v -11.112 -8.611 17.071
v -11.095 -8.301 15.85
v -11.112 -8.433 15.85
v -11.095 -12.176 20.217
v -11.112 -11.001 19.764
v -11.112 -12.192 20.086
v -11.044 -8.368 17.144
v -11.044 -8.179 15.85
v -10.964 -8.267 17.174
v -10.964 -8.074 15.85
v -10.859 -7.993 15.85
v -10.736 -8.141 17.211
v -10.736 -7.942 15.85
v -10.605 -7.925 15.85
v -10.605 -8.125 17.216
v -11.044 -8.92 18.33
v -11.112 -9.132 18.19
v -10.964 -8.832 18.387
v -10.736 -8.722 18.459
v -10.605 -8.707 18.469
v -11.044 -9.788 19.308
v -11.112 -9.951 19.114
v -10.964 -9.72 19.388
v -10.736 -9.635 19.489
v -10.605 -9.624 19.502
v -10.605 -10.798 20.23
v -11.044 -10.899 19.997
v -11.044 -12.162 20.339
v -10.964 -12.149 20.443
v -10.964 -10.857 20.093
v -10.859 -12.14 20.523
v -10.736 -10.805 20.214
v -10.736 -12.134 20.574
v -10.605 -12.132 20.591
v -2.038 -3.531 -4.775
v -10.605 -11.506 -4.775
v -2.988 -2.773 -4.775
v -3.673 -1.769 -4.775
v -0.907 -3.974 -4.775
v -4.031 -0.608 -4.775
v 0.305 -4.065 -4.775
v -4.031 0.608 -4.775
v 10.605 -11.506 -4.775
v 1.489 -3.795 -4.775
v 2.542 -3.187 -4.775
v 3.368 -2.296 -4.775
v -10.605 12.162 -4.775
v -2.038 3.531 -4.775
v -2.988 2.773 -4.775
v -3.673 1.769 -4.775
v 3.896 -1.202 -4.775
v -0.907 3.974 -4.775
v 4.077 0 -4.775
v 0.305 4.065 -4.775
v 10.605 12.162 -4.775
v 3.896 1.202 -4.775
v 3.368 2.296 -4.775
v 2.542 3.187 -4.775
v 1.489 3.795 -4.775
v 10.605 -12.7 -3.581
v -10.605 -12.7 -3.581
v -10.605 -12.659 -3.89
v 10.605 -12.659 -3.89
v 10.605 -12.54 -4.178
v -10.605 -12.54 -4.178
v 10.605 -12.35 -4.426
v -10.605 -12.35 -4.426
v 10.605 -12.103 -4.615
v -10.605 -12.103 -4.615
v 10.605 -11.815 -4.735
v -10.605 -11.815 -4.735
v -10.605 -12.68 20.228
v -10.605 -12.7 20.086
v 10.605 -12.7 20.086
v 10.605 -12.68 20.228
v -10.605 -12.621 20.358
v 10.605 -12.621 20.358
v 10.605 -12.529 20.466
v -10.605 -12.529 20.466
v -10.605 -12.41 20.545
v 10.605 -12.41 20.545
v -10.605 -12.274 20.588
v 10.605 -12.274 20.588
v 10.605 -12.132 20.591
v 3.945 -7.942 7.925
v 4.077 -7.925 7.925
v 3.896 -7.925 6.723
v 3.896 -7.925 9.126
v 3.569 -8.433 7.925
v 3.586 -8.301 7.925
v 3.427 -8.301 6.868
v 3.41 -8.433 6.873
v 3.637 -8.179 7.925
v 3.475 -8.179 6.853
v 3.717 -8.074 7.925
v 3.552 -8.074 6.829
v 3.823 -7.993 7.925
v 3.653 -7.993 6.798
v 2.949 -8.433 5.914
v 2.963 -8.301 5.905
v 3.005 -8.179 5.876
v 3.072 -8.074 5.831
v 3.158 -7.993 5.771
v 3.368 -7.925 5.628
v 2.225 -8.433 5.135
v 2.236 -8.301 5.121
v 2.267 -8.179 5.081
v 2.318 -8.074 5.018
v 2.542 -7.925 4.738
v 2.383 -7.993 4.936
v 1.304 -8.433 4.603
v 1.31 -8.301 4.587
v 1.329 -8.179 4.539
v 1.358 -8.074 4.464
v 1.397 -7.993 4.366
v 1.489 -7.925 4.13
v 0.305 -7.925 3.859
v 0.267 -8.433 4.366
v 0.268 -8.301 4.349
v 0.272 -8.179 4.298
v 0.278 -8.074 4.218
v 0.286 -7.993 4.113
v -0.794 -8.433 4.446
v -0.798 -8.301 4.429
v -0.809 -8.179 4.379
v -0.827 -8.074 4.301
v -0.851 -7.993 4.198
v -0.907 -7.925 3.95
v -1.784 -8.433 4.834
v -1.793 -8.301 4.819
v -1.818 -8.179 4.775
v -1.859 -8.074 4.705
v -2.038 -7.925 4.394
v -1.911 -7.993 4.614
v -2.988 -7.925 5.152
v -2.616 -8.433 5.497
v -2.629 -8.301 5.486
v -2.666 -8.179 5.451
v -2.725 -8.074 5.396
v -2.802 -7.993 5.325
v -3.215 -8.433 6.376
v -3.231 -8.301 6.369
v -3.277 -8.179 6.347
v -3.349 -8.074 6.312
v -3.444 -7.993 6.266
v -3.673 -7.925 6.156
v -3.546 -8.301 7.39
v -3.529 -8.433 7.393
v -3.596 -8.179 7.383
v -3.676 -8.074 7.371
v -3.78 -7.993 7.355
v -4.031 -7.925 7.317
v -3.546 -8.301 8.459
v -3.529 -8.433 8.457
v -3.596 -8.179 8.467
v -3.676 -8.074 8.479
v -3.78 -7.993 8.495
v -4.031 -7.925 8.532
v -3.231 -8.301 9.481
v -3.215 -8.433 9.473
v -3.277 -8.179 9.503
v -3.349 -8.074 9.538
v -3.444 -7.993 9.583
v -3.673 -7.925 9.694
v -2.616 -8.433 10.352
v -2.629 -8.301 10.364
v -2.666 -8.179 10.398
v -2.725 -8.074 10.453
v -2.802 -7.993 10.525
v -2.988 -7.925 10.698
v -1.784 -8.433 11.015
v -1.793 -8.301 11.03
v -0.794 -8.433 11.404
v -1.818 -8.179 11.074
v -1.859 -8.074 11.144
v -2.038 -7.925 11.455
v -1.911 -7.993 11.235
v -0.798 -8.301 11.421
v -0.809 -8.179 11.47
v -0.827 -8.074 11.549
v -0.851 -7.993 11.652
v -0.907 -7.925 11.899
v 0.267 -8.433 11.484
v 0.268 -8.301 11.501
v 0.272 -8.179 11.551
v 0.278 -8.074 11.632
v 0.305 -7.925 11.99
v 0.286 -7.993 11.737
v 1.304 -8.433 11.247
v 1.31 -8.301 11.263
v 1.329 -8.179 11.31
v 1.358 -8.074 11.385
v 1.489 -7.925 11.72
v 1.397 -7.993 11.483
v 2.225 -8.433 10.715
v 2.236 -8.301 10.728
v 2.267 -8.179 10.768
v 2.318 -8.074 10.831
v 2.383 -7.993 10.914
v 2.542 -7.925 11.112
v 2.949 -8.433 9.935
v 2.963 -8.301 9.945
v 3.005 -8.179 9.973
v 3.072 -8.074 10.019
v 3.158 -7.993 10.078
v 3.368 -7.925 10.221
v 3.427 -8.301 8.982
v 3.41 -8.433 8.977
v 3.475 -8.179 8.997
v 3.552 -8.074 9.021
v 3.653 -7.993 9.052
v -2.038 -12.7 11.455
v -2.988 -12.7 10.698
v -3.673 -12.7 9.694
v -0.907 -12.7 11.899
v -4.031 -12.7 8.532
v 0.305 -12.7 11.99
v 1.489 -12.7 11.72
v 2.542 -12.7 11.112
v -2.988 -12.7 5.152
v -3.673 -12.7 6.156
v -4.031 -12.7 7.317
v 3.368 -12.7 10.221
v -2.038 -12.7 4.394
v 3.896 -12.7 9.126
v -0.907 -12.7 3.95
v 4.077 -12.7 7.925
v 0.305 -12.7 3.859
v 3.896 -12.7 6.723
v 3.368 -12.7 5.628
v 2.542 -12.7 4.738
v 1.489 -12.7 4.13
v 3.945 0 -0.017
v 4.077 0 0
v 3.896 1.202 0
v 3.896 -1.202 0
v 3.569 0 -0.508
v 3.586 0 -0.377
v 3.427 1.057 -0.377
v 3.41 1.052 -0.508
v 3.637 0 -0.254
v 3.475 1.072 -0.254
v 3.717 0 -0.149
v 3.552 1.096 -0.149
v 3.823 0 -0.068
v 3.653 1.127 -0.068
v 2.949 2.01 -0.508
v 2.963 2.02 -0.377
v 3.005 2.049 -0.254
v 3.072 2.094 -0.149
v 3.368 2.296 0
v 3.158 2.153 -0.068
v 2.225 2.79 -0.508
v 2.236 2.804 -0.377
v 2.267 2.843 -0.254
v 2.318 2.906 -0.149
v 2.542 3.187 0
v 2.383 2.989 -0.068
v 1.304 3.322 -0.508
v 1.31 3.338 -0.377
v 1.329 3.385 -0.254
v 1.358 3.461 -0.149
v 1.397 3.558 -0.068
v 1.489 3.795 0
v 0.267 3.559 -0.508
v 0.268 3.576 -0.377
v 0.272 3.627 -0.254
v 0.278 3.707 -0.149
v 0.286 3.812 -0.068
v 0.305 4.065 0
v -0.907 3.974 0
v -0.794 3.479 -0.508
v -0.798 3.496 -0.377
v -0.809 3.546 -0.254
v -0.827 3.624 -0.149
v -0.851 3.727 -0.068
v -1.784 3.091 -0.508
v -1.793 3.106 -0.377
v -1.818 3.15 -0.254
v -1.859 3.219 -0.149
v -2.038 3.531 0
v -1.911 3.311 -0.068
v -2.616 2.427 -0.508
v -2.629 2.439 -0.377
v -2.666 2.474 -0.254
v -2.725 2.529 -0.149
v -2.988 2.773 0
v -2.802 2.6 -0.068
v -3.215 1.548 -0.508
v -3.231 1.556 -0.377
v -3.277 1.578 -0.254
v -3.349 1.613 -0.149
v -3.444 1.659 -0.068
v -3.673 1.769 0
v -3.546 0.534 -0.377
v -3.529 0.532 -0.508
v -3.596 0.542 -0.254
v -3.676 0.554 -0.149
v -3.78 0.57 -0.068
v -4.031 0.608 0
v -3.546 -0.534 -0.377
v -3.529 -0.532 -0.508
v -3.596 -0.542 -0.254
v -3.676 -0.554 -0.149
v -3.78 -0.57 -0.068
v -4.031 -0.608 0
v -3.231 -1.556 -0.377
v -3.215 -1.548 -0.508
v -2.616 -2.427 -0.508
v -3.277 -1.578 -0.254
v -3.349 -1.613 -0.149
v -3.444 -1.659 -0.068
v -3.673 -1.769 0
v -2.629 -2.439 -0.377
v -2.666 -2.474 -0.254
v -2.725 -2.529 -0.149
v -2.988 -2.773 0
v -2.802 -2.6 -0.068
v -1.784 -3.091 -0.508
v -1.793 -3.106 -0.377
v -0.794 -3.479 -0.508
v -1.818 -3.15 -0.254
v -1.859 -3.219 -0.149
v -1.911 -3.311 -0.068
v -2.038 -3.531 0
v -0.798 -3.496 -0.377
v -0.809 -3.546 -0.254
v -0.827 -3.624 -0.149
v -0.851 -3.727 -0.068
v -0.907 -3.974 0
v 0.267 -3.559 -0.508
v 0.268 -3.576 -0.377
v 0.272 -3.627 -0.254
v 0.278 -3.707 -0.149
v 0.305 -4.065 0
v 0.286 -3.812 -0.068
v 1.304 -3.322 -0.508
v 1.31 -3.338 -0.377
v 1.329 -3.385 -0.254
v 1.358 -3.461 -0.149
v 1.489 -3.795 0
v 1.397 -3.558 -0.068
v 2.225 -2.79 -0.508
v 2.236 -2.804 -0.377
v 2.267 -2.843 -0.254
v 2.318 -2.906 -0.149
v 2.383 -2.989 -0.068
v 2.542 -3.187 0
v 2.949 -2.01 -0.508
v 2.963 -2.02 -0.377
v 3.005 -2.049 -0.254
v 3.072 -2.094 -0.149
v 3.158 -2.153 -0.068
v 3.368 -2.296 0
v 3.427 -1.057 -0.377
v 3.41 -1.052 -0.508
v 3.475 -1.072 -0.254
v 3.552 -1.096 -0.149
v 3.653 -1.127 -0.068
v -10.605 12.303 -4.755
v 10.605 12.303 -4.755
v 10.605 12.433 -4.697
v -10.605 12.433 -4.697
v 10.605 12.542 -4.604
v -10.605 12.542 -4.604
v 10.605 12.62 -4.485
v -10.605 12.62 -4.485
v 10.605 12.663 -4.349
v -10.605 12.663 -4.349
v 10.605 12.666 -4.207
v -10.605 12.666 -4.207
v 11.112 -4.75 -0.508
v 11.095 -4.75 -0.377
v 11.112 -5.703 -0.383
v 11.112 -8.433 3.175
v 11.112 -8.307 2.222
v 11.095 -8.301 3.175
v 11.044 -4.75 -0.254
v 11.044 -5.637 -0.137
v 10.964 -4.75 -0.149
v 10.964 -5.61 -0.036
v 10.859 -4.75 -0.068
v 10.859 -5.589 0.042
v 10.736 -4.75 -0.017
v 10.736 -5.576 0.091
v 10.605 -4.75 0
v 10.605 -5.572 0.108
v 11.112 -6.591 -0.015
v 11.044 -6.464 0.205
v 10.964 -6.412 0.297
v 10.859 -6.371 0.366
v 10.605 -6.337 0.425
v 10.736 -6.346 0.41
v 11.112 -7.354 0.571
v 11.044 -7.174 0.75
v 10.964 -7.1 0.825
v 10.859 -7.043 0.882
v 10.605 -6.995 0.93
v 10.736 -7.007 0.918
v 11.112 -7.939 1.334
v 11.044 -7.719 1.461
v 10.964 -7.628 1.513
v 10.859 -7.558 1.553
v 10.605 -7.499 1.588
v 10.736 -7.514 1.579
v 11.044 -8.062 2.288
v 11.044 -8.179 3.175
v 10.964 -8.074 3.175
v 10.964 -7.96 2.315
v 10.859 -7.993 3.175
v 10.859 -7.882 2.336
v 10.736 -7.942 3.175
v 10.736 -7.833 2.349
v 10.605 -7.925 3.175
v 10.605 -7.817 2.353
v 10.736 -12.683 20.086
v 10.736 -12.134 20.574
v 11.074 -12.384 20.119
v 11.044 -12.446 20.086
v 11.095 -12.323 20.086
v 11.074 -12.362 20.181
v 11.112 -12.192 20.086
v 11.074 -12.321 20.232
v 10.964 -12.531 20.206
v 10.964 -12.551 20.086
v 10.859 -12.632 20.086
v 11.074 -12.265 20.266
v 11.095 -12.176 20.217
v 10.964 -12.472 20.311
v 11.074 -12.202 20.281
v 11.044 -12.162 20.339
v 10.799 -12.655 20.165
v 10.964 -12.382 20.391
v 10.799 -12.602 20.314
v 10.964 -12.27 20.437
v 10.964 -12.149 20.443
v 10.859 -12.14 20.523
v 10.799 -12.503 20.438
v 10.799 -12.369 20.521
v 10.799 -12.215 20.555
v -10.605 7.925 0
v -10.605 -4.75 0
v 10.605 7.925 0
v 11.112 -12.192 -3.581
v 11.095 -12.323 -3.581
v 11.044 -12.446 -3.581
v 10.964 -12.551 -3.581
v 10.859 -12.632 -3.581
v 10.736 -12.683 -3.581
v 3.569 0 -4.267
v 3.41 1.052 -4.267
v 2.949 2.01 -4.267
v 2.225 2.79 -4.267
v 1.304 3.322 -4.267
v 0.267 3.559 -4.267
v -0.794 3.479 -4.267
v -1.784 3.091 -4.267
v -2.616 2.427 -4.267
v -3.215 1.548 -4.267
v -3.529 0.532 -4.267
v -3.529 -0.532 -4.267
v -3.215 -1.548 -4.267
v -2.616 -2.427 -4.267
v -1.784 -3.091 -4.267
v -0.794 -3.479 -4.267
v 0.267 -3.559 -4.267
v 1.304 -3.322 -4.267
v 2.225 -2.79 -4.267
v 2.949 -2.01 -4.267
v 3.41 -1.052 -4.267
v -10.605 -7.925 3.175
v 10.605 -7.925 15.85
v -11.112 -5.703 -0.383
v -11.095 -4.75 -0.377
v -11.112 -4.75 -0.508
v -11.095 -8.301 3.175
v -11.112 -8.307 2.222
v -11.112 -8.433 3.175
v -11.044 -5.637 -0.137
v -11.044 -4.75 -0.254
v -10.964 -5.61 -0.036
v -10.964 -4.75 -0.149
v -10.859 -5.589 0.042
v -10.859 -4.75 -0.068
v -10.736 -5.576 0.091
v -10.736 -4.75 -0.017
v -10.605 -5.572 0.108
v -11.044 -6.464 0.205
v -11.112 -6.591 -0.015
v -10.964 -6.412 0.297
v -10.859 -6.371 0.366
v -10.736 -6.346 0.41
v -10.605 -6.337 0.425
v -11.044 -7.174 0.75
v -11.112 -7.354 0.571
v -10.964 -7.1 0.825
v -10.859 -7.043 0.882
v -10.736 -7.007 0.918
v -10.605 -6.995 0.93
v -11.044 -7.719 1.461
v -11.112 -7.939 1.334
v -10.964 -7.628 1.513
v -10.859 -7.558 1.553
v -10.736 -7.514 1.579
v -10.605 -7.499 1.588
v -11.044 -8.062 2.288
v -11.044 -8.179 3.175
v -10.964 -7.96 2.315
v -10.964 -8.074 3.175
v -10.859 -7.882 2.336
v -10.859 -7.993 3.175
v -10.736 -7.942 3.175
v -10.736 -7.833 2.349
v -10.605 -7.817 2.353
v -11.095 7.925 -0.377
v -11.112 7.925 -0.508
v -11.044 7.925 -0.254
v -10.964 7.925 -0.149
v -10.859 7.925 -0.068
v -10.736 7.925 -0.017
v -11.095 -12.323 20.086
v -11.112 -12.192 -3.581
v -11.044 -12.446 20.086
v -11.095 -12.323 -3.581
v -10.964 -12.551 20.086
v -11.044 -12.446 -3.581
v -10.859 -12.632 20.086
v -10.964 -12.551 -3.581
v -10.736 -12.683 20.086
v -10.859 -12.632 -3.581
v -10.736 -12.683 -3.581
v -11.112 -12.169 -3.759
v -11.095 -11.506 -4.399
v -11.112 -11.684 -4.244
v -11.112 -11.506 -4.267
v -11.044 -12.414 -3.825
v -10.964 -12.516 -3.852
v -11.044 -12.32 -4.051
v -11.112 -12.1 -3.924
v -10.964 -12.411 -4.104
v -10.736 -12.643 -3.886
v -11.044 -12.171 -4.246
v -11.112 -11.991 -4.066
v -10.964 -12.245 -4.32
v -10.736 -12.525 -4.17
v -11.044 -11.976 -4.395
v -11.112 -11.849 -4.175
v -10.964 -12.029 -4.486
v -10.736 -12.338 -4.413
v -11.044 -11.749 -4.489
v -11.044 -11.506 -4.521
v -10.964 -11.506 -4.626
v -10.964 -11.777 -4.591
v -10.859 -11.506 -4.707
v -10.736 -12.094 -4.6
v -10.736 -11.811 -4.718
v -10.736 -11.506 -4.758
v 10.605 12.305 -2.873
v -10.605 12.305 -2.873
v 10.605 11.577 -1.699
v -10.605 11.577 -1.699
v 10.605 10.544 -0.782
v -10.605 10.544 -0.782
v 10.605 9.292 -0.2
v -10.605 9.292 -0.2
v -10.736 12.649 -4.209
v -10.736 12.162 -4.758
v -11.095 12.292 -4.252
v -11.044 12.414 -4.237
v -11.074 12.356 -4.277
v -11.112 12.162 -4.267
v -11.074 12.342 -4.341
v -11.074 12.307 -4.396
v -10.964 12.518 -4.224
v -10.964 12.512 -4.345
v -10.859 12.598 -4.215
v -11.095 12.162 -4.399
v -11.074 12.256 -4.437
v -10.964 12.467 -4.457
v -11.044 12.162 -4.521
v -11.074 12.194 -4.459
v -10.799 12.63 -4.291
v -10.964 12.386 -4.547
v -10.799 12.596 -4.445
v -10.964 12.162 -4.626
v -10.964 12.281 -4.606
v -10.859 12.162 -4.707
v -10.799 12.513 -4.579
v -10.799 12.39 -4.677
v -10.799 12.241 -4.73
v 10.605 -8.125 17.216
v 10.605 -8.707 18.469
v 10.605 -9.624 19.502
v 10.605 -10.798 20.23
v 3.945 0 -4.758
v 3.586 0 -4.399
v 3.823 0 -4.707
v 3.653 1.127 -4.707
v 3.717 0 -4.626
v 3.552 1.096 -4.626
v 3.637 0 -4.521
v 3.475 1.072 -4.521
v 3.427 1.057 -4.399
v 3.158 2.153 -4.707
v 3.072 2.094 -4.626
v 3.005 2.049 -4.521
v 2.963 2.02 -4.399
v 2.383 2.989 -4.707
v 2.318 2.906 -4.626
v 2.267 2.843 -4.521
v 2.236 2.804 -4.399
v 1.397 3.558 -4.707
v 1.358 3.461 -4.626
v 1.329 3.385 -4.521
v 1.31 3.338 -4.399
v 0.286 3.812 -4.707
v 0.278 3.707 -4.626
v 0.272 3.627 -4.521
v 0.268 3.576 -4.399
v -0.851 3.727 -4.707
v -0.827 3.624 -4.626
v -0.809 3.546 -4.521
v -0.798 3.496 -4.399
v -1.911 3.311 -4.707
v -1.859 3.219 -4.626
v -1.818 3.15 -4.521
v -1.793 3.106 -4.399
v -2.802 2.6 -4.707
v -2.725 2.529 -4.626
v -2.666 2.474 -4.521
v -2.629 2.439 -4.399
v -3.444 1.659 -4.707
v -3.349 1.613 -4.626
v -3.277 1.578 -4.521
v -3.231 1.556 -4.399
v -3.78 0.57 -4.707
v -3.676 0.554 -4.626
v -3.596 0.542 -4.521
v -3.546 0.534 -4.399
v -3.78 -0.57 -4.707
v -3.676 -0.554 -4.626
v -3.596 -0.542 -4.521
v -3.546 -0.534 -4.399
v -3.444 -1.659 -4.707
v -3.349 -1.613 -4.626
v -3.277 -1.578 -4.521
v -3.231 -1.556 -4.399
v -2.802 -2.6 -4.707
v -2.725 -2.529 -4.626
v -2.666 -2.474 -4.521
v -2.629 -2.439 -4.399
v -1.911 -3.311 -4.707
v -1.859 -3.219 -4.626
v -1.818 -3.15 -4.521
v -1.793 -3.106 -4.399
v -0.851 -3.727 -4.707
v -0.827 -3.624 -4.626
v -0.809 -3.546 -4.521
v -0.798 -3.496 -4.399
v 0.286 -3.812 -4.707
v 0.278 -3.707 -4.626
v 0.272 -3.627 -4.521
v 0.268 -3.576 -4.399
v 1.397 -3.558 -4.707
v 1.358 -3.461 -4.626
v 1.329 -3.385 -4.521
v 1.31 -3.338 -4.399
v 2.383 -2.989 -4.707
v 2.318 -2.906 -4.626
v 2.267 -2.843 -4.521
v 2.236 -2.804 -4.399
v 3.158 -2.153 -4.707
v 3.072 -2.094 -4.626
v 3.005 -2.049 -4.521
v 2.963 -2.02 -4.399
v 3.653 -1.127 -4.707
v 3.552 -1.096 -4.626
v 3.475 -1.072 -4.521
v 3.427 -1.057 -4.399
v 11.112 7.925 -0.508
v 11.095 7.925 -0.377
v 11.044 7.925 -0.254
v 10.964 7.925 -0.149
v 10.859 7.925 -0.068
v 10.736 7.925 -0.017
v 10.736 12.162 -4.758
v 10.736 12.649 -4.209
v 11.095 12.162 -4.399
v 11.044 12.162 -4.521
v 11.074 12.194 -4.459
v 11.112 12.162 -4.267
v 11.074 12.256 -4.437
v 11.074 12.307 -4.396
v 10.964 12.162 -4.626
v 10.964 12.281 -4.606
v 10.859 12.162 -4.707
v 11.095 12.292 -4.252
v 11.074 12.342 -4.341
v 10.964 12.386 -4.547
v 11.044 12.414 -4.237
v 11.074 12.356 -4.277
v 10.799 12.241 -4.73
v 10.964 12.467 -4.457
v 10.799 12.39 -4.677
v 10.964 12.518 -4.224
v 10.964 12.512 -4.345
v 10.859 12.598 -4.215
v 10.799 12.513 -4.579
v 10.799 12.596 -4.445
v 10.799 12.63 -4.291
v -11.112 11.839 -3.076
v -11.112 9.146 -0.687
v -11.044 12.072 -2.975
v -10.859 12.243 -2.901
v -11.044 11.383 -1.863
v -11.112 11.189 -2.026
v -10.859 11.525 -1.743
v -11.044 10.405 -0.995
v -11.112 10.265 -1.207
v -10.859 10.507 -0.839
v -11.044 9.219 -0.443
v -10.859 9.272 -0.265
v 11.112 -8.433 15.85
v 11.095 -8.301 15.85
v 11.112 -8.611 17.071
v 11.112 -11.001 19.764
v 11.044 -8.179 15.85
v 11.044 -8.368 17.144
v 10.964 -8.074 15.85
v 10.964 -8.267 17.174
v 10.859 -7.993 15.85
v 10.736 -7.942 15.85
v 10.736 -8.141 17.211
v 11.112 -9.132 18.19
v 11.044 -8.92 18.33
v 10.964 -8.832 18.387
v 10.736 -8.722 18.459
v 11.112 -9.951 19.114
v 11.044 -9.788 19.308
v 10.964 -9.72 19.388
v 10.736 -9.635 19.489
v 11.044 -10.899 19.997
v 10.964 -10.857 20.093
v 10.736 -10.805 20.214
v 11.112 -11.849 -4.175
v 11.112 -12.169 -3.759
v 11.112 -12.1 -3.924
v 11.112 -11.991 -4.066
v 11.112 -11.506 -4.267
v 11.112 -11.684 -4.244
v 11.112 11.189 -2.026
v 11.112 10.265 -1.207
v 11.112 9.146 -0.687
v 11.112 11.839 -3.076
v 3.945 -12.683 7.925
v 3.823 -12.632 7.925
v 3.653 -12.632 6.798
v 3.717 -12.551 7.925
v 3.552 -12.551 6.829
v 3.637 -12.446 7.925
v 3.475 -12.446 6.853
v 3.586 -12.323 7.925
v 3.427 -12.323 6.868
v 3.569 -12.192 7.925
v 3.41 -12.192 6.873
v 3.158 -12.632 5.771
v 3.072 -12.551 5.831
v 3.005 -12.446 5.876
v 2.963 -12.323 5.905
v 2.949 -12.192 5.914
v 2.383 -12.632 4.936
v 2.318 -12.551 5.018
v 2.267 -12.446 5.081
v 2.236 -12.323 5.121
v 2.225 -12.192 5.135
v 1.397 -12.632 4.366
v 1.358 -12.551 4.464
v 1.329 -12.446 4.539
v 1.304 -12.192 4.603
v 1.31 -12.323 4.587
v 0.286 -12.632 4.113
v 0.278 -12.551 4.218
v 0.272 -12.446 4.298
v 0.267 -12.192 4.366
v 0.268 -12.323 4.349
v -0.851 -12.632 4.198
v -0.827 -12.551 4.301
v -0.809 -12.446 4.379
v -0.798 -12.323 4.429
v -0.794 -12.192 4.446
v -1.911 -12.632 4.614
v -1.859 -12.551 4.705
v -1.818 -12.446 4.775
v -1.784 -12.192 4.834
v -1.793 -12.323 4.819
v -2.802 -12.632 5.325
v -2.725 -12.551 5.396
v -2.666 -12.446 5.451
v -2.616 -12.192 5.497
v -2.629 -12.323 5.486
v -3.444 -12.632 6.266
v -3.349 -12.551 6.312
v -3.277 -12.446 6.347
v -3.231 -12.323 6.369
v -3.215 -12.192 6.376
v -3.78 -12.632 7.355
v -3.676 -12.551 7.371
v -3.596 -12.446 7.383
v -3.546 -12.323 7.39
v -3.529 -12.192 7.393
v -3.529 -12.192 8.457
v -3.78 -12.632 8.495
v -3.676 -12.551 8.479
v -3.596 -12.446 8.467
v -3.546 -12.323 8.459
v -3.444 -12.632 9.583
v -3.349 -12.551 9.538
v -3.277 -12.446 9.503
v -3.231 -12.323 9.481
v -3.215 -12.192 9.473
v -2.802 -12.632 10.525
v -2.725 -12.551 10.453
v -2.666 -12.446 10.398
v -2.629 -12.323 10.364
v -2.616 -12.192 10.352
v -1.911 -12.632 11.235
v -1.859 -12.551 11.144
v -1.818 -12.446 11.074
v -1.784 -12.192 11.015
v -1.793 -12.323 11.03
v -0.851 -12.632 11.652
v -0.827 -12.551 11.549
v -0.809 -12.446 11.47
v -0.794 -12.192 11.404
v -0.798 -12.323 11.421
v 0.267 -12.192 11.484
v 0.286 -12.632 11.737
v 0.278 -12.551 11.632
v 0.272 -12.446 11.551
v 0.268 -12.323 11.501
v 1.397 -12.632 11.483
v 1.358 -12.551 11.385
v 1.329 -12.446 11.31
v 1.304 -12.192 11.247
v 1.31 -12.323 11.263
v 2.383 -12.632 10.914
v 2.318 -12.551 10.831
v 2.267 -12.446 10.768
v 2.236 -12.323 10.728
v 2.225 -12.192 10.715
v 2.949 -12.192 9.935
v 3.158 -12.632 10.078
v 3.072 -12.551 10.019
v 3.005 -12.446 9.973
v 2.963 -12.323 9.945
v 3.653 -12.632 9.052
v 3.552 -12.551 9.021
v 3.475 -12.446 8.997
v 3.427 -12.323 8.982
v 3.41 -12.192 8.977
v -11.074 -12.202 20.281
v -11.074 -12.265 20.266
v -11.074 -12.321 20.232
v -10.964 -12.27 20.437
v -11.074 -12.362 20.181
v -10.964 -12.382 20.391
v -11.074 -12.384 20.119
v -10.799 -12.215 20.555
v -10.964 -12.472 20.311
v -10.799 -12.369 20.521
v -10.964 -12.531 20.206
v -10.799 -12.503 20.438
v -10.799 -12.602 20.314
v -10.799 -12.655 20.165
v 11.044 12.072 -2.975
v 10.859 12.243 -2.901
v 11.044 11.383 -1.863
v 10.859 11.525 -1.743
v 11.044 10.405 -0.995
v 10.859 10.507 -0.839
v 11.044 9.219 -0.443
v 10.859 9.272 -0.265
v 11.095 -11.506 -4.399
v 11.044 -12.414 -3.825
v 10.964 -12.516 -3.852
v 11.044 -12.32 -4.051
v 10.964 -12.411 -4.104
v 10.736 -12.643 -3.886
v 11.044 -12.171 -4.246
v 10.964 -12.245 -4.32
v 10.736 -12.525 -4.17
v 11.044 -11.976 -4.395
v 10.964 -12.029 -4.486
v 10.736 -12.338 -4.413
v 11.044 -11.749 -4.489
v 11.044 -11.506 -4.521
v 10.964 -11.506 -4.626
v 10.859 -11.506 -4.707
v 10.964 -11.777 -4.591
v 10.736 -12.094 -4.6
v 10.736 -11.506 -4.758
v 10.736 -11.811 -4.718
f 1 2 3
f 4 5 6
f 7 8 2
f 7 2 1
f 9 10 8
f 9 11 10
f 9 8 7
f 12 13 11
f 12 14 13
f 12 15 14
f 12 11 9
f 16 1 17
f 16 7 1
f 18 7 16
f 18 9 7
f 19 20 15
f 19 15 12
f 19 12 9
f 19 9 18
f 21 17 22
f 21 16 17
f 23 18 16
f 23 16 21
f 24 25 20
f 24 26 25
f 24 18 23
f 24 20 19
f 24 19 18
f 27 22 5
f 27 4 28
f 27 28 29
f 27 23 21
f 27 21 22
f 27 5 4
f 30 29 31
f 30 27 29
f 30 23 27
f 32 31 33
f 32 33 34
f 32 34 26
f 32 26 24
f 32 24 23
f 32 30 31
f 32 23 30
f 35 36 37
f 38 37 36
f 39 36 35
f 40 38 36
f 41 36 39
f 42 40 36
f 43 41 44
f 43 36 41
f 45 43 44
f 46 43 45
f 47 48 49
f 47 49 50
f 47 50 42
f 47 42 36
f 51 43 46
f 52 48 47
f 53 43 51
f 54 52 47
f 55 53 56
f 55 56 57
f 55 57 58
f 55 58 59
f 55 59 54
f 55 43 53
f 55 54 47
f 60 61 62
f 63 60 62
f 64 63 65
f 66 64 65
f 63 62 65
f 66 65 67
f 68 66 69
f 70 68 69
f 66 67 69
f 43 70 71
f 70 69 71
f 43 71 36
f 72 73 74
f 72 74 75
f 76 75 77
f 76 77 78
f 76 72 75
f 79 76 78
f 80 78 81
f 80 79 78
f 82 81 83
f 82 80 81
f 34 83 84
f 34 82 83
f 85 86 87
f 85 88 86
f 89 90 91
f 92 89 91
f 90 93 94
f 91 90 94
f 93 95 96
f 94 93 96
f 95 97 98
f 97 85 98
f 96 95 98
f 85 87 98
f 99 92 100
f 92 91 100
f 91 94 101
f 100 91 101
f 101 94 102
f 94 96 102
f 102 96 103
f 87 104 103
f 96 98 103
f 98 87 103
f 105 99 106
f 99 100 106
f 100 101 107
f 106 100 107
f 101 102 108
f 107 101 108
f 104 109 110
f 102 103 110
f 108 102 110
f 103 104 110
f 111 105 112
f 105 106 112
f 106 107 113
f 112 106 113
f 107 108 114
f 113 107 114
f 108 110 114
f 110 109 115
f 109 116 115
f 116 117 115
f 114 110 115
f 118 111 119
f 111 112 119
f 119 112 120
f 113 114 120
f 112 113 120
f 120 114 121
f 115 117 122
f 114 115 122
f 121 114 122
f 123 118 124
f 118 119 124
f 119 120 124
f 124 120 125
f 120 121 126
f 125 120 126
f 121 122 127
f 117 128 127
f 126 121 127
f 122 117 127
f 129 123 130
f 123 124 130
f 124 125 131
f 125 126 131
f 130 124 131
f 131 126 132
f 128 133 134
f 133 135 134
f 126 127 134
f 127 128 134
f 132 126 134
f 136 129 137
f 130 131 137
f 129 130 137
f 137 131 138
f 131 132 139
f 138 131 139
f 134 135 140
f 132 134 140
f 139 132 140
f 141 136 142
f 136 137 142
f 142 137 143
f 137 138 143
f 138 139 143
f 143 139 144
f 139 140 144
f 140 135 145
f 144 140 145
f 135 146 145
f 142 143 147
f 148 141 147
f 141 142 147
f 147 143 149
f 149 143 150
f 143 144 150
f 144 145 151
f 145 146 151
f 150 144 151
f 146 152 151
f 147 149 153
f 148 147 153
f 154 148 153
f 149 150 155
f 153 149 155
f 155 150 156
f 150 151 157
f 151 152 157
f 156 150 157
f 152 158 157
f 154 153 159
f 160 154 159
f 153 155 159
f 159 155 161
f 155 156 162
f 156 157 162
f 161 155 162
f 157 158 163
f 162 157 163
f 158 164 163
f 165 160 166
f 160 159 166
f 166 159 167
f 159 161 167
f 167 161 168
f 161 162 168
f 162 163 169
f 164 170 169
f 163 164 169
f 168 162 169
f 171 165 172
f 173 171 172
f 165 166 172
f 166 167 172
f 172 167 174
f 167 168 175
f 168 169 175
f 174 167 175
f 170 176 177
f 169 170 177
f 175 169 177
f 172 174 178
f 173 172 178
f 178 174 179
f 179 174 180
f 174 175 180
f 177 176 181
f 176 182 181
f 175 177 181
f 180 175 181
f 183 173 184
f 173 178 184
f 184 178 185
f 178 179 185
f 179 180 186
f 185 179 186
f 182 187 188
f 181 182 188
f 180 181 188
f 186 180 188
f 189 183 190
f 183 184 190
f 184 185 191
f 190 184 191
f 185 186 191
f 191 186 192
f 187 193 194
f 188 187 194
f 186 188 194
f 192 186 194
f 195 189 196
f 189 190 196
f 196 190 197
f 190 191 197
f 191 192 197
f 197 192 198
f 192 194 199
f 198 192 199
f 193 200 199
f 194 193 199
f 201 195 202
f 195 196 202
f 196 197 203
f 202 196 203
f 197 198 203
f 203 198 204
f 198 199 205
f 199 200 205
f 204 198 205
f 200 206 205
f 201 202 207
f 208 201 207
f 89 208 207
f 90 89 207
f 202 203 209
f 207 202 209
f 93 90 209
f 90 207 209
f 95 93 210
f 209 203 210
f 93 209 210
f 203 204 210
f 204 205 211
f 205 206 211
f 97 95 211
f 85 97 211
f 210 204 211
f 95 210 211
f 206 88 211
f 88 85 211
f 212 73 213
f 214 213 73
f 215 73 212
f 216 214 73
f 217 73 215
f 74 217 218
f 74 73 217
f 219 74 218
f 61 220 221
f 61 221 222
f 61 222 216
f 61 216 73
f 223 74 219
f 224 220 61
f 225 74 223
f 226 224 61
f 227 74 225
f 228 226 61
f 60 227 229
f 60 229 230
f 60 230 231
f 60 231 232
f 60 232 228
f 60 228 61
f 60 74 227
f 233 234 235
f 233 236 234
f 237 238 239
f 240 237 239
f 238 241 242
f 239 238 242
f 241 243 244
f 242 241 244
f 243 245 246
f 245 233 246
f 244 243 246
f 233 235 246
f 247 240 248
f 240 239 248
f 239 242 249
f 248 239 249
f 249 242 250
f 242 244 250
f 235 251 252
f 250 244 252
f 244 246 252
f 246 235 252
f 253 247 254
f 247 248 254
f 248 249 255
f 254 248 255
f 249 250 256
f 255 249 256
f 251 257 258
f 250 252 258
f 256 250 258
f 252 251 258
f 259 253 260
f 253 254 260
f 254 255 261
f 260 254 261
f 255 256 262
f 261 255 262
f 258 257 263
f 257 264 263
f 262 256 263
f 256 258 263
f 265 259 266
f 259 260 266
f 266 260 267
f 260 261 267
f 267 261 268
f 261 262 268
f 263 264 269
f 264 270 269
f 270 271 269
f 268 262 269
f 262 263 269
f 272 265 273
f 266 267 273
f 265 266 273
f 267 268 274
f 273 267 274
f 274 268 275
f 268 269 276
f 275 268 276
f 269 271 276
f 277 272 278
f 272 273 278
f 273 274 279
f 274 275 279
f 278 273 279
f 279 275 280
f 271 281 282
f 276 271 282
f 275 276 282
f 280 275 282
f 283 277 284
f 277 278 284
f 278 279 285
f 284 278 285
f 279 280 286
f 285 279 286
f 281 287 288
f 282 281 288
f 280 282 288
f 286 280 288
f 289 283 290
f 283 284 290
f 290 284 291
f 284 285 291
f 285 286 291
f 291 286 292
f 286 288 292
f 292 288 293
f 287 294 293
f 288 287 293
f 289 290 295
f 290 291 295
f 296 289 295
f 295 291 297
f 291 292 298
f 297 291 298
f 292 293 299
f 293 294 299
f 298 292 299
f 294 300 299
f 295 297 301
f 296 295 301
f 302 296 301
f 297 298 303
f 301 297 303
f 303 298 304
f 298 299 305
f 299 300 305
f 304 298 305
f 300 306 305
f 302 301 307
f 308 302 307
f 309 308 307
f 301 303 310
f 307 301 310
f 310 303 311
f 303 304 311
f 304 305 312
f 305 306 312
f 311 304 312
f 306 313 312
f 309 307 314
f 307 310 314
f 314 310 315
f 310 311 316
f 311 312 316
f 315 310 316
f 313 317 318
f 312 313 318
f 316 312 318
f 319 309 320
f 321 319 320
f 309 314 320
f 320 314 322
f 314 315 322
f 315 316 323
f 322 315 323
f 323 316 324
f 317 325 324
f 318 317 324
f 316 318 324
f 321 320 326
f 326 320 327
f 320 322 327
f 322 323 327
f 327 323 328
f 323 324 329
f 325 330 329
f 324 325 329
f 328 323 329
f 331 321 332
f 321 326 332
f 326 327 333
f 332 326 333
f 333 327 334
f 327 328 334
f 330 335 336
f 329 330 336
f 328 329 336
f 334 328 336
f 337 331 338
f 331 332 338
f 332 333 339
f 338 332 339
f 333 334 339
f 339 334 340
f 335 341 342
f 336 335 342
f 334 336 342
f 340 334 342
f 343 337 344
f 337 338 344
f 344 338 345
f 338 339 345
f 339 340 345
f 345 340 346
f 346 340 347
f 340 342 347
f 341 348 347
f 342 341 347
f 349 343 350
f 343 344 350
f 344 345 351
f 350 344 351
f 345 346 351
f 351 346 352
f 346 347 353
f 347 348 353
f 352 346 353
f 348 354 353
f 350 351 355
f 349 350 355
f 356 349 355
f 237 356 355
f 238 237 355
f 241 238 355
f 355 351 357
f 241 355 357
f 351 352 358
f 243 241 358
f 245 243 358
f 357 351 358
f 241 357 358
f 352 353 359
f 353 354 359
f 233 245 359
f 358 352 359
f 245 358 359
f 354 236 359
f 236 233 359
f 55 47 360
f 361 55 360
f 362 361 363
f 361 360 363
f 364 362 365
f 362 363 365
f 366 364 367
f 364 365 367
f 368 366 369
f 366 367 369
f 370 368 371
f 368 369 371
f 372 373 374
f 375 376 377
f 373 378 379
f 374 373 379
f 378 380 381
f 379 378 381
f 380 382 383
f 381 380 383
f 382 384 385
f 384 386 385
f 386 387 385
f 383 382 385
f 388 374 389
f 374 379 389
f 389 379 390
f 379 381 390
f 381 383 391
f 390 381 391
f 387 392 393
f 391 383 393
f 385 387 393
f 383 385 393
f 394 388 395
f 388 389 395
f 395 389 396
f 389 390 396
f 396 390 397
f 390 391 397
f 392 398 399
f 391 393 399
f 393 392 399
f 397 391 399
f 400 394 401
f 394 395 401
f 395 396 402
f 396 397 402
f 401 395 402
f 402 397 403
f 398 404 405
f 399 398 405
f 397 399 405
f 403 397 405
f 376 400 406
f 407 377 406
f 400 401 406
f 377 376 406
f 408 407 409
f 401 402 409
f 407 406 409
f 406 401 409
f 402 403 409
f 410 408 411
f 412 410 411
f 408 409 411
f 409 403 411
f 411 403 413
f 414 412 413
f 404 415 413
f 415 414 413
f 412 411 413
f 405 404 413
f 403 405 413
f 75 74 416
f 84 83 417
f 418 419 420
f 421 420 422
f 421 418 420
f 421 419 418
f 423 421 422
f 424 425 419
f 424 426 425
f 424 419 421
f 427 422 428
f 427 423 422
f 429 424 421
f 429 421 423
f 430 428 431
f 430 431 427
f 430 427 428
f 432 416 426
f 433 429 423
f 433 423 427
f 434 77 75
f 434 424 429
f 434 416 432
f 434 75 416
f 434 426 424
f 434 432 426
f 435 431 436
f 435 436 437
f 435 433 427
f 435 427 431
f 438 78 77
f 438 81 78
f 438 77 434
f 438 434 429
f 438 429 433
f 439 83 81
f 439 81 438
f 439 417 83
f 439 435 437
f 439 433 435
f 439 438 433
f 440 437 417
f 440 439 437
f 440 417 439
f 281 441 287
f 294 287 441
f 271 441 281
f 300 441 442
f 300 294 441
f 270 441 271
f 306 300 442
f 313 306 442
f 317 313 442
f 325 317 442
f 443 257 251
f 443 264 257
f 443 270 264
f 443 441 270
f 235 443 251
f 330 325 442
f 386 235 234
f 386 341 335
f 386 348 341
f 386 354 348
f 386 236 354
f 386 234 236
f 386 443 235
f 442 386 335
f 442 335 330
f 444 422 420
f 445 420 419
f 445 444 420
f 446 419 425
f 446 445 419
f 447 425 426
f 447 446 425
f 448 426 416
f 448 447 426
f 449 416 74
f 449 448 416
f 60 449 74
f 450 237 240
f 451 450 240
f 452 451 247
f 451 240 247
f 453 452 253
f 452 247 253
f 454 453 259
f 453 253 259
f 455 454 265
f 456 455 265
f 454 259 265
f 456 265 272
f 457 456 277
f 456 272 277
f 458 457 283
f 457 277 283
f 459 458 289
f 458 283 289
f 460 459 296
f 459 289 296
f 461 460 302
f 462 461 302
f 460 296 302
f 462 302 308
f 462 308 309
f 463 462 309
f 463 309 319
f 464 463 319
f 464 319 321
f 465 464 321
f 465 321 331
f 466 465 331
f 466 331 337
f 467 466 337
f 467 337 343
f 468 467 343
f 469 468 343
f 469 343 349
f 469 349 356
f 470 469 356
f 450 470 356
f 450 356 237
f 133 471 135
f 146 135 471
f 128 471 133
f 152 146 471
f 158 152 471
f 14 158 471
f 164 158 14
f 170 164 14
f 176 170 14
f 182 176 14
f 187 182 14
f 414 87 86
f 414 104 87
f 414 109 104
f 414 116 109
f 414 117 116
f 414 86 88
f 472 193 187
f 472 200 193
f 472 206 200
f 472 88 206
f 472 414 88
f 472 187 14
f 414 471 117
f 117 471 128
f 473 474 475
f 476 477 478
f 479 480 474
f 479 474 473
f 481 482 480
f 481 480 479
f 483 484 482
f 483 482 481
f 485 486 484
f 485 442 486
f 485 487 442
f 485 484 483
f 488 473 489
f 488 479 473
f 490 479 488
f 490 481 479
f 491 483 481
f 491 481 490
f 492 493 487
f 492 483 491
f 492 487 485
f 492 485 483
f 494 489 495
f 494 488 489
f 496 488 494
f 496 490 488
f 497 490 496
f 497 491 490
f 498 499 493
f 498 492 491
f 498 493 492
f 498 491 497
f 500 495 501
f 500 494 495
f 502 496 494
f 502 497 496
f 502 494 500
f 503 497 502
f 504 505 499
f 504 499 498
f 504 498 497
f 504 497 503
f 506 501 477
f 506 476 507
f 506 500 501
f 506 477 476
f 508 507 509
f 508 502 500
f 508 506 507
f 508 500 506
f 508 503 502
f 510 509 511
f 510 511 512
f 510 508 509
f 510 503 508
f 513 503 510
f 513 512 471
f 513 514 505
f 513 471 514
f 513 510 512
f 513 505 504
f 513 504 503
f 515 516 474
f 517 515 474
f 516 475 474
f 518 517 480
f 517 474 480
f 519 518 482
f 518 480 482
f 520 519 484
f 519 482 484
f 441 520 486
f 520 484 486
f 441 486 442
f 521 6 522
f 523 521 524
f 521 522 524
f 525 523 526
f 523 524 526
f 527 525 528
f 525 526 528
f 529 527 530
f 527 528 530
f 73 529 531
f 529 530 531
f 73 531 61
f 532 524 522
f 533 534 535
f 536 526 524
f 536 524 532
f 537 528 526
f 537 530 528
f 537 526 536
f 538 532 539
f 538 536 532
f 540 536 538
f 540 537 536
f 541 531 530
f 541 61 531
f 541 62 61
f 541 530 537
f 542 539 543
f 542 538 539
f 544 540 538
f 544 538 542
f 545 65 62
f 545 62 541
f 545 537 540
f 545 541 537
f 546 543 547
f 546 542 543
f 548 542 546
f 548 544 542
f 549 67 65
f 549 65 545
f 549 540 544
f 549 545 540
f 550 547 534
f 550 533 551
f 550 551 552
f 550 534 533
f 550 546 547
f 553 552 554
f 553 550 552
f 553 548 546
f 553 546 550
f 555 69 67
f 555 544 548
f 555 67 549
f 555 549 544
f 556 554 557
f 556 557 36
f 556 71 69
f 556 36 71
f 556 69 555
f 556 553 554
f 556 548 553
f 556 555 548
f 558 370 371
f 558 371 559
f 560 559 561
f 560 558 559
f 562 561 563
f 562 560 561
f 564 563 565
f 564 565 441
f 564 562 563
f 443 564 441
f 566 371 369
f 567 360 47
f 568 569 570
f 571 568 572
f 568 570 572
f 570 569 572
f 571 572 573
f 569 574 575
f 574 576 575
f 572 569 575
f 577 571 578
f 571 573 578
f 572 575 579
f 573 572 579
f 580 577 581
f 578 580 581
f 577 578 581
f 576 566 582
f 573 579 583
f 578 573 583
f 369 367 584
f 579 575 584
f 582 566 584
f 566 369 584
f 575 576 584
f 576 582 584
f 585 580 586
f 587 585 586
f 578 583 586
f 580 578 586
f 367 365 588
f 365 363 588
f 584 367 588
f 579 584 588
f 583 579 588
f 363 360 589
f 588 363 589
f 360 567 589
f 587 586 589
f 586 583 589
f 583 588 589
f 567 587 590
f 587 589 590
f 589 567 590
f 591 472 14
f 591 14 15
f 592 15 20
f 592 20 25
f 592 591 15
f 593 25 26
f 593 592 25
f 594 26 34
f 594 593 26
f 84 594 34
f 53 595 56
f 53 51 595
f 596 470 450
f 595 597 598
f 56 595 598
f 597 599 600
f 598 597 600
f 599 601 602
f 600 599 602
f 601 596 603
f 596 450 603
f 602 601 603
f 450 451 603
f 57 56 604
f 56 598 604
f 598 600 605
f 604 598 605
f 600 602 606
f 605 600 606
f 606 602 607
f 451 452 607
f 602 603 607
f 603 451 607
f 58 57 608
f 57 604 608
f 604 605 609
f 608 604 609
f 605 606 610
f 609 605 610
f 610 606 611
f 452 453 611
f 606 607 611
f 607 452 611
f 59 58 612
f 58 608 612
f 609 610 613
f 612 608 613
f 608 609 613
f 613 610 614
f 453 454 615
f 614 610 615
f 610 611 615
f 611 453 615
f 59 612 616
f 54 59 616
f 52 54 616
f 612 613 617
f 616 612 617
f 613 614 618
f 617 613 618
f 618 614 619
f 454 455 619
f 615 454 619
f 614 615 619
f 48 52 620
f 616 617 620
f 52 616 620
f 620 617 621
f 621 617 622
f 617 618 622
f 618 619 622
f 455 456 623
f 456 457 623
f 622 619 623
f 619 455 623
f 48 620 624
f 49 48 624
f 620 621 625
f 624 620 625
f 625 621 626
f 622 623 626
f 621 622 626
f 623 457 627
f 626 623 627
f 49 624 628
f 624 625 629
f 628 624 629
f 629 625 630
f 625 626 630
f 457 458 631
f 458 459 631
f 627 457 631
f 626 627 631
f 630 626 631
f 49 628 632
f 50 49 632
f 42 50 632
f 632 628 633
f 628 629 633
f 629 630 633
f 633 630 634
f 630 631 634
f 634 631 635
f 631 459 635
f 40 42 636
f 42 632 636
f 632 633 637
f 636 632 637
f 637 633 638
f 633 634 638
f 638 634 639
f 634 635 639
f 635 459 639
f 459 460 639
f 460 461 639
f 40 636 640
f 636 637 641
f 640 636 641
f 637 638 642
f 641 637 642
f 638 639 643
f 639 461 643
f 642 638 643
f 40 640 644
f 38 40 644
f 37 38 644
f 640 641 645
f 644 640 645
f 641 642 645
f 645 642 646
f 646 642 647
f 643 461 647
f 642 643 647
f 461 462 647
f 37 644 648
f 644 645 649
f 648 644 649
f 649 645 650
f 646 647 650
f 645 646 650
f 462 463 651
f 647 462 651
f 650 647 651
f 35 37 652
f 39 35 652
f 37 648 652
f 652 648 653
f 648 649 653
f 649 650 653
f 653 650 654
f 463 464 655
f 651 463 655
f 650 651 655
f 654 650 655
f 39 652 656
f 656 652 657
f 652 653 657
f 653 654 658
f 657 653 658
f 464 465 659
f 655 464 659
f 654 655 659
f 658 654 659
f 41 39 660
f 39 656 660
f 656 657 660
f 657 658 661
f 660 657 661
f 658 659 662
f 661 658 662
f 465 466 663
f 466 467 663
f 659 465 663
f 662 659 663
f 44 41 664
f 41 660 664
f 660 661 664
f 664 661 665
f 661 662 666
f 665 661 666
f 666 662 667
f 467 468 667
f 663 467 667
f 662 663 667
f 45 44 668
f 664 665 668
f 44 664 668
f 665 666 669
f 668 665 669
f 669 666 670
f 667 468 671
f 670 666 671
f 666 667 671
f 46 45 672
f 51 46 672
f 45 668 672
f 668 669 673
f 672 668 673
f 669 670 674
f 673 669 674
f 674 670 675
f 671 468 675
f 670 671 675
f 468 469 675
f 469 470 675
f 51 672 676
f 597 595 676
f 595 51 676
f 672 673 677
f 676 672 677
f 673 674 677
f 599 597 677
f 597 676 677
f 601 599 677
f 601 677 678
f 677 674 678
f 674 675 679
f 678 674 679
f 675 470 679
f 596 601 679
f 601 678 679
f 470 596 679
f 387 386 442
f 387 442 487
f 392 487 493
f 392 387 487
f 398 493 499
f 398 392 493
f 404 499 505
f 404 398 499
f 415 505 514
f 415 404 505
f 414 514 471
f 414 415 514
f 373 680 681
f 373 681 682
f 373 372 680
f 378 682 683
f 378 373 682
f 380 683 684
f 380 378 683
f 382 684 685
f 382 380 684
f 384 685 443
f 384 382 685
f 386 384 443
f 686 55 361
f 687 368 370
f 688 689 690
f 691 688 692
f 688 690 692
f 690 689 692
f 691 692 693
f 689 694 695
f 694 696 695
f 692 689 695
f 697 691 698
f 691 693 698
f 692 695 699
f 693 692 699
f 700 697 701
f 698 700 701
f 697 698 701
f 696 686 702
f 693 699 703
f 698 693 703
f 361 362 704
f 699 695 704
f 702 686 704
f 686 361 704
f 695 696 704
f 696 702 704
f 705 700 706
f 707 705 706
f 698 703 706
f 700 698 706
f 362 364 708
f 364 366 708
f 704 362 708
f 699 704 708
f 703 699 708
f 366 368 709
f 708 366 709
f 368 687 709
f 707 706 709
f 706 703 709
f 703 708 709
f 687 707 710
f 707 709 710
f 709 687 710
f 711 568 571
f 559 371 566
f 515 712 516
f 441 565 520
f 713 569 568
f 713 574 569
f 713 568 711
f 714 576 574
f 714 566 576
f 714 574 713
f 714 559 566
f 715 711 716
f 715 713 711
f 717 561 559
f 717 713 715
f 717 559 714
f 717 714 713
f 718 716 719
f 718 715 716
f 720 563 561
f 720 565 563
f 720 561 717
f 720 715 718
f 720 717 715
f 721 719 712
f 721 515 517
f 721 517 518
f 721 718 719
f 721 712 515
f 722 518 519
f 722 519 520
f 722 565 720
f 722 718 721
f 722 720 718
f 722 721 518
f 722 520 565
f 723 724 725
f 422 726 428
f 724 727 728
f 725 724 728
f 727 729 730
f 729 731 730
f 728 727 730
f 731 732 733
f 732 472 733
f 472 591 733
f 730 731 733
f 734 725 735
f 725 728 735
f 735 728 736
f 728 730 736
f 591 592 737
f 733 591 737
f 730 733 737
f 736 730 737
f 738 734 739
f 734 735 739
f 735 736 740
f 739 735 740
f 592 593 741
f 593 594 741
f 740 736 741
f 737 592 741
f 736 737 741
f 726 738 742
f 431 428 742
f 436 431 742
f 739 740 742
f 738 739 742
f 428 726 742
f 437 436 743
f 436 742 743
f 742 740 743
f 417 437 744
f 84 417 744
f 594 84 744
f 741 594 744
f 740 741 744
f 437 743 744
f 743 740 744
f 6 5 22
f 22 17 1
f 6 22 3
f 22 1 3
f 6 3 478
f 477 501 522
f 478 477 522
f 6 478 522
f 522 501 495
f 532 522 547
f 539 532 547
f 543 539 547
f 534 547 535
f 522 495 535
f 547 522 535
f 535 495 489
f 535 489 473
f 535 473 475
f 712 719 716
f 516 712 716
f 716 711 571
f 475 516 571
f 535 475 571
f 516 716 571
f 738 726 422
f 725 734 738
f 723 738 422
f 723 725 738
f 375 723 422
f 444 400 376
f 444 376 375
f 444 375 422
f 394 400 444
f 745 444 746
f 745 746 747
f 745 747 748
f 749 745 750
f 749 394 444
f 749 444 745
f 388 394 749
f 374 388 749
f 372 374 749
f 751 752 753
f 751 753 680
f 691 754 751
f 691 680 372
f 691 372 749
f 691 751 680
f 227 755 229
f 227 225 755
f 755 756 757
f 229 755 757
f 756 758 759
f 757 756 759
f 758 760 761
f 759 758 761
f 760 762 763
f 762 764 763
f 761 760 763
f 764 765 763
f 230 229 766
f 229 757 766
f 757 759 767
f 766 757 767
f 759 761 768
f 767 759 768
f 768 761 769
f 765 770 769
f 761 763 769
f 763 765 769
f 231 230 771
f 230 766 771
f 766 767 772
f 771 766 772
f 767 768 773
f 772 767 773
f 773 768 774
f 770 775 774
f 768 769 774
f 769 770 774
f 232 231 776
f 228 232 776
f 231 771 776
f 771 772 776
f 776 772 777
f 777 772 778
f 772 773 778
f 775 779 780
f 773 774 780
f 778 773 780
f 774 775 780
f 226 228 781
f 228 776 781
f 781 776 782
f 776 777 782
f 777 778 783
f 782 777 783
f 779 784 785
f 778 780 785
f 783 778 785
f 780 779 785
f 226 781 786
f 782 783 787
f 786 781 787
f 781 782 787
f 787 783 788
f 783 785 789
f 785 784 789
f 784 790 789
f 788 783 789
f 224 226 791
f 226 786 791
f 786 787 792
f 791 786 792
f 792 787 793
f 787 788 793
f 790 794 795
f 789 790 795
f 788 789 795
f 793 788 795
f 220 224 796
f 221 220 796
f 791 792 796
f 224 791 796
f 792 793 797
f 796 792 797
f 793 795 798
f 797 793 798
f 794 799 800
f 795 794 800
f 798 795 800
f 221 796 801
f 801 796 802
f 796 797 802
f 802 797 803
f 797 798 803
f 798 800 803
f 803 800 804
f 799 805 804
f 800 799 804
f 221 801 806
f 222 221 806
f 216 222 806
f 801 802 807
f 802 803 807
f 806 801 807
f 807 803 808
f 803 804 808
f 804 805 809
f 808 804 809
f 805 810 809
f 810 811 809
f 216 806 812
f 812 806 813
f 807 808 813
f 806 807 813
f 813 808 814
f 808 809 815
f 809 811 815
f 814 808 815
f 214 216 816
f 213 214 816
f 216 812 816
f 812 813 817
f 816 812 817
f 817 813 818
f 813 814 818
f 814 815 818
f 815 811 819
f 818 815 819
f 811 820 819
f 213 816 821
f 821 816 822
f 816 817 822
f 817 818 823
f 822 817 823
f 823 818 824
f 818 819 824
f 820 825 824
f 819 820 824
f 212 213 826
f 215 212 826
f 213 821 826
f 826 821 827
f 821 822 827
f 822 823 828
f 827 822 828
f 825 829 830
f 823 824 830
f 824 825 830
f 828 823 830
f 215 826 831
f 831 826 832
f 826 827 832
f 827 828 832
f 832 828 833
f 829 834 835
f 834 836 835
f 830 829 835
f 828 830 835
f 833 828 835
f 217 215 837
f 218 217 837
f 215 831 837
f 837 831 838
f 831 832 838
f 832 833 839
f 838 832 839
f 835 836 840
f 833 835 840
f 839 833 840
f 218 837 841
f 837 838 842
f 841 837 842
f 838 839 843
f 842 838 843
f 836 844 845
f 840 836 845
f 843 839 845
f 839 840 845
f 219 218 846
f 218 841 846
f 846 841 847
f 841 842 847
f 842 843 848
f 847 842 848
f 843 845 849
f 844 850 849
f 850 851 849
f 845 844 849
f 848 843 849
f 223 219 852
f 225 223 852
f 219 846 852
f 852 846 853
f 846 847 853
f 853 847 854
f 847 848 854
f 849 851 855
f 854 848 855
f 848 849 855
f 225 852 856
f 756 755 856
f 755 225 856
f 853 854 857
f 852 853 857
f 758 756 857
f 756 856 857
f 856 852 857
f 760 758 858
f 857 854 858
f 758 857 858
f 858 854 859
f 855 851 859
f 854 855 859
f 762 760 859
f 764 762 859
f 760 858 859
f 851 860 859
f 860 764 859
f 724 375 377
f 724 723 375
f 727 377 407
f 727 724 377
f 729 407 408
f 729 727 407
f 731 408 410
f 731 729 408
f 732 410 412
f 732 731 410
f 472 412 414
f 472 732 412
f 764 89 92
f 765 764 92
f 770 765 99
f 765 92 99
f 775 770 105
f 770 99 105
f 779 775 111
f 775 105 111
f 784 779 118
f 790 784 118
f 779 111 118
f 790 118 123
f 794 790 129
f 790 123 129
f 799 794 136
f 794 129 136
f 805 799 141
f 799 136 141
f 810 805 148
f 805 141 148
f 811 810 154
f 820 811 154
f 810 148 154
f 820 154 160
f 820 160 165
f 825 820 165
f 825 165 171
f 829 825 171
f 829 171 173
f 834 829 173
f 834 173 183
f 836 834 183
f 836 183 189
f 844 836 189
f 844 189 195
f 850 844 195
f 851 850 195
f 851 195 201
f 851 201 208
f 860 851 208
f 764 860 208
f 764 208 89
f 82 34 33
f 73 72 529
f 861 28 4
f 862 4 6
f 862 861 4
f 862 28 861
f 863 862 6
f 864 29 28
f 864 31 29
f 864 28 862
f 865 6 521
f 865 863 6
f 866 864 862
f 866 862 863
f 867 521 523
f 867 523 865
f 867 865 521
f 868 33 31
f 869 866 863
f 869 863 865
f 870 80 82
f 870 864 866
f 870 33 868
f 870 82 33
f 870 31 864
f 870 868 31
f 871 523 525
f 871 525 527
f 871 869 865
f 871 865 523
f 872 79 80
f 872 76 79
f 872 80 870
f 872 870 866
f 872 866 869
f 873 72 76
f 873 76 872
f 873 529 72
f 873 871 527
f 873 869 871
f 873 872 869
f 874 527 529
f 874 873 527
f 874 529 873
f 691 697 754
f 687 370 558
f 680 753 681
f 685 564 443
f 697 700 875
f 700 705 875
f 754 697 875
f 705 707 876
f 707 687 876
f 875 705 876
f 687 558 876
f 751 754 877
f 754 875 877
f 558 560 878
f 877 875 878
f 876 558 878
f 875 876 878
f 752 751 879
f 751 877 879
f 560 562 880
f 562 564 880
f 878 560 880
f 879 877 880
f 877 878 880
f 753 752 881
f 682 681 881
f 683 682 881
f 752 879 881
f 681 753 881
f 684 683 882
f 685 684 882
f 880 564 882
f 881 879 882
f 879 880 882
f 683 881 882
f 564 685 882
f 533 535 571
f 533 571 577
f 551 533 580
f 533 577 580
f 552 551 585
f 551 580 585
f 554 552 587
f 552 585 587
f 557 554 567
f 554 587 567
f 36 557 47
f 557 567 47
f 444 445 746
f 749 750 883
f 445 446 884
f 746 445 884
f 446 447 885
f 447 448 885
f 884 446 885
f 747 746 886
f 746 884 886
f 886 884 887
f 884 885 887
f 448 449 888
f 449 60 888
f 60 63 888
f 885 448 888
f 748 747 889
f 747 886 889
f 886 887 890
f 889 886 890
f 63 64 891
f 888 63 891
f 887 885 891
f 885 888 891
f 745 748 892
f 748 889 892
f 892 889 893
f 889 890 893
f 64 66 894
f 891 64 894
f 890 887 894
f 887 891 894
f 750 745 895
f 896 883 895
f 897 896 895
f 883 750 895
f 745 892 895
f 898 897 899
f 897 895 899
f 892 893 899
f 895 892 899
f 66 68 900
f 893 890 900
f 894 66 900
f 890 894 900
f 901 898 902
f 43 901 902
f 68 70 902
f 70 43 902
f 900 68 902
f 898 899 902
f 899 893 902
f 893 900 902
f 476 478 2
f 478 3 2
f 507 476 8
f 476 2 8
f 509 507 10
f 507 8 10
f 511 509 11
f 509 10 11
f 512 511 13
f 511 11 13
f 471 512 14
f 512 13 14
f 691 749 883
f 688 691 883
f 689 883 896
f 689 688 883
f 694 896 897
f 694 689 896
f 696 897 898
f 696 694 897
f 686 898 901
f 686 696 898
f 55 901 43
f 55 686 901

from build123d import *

# Parameters (mm, degrees)
BOSS_EXTRUDE1_START = 11.1125
BOSS_EXTRUDE1_DEPTH = 22.225
FILLET1_R           = 1.1938
SKETCH4_R           = 3.5687
CUT_EXTRUDE1_DEPTH  = 5.7752
SKETCH5_R           = 3.5687
CUT_EXTRUDE2_DEPTH  = 5.7752
FILLET2_R           = 0.508
FILLET3_R           = 0.508


with BuildPart() as part:
    # Sketch3 → Boss-Extrude1 (new body)
    with BuildSketch(Plane(origin=(0, 0, 0), x_dir=(0, 0, -1), z_dir=(1, 0, 0)).offset(BOSS_EXTRUDE1_START)):
        with BuildLine():
            Line((-3.175, -7.9248), (-15.8496, -7.9248))
            ThreePointArc((-15.8496, -7.9248), (-19.226176302, -9.323423698), (-20.6248, -12.7))
            Line((-20.6248, -12.7), (4.7752, -12.7))
            Line((4.7752, -12.7), (4.7752, 12.7))
            ThreePointArc((4.7752, 12.7), (1.398623698, 11.301376302), (0, 7.9248))
            Line((0, 7.9248), (0, -4.7498))
            ThreePointArc((0, -4.7498), (-0.92993597, -6.99486403), (-3.175, -7.9248))
        make_face()
    extrude(amount=-BOSS_EXTRUDE1_DEPTH)

    # Fillet1
    fillet1_edges = [part.edges().sort_by_distance(p)[0] for p in [
        (0, -12.7, -4.7752),
    ]]
    fillet(fillet1_edges, radius=FILLET1_R)

    # Sketch4 → Cut-Extrude1 (cut, through all)
    with BuildSketch(Plane.XY):
        Circle(SKETCH4_R)
    extrude(amount=-CUT_EXTRUDE1_DEPTH, mode=Mode.SUBTRACT)

    # Sketch5 → Cut-Extrude2 (cut, through all)
    with BuildSketch(Plane(origin=(0, -7.9248, 0), x_dir=(1, 0, 0), z_dir=(0, 1, 0))):
        with Locations((0, -7.9248)):
            Circle(SKETCH5_R)
    extrude(amount=-CUT_EXTRUDE2_DEPTH, mode=Mode.SUBTRACT)

    # Fillet2
    fillet2_edges = [part.edges().sort_by_distance(p)[0] for p in [
        (0, 12.7, -4.7752),
        (0, -12.7, 20.6248),
        (-11.1125, 11.301376302, -1.398623698),
        (-11.1125, 1.5875, 0),
        (-11.1125, -6.99486403, 0.92993597),
        (11.1125, 0.5969, -4.7752),
        (-11.1125, -7.9248, 9.5123),
        (11.1125, -12.350344075, -4.425544075),
        (-11.1125, 0.5969, -4.7752),
        (-11.1125, -12.350344075, -4.425544075),
        (-3.5687, -12.7, 7.9248),
        (-11.1125, -9.323423698, 19.226176302),
        (11.1125, -7.9248, 9.5123),
        (-11.1125, -12.7, 8.5217),
        (11.1125, -6.99486403, 0.92993597),
        (11.1125, 1.5875, 0),
        (11.1125, 11.301376302, -1.398623698),
        (11.1125, -12.7, 8.5217),
        (11.1125, -9.323423698, 19.226176302),
    ]]
    fillet(fillet2_edges, radius=FILLET2_R)

    # Fillet3
    fillet3_edges = [part.edges().sort_by_distance(p)[0] for p in [
        (-3.5687, 0, -4.7752),
        (-3.5687, 0, 0),
        (-3.5687, -7.9248, 7.9248),
    ]]
    fillet(fillet3_edges, radius=FILLET3_R)


solid = part.part
